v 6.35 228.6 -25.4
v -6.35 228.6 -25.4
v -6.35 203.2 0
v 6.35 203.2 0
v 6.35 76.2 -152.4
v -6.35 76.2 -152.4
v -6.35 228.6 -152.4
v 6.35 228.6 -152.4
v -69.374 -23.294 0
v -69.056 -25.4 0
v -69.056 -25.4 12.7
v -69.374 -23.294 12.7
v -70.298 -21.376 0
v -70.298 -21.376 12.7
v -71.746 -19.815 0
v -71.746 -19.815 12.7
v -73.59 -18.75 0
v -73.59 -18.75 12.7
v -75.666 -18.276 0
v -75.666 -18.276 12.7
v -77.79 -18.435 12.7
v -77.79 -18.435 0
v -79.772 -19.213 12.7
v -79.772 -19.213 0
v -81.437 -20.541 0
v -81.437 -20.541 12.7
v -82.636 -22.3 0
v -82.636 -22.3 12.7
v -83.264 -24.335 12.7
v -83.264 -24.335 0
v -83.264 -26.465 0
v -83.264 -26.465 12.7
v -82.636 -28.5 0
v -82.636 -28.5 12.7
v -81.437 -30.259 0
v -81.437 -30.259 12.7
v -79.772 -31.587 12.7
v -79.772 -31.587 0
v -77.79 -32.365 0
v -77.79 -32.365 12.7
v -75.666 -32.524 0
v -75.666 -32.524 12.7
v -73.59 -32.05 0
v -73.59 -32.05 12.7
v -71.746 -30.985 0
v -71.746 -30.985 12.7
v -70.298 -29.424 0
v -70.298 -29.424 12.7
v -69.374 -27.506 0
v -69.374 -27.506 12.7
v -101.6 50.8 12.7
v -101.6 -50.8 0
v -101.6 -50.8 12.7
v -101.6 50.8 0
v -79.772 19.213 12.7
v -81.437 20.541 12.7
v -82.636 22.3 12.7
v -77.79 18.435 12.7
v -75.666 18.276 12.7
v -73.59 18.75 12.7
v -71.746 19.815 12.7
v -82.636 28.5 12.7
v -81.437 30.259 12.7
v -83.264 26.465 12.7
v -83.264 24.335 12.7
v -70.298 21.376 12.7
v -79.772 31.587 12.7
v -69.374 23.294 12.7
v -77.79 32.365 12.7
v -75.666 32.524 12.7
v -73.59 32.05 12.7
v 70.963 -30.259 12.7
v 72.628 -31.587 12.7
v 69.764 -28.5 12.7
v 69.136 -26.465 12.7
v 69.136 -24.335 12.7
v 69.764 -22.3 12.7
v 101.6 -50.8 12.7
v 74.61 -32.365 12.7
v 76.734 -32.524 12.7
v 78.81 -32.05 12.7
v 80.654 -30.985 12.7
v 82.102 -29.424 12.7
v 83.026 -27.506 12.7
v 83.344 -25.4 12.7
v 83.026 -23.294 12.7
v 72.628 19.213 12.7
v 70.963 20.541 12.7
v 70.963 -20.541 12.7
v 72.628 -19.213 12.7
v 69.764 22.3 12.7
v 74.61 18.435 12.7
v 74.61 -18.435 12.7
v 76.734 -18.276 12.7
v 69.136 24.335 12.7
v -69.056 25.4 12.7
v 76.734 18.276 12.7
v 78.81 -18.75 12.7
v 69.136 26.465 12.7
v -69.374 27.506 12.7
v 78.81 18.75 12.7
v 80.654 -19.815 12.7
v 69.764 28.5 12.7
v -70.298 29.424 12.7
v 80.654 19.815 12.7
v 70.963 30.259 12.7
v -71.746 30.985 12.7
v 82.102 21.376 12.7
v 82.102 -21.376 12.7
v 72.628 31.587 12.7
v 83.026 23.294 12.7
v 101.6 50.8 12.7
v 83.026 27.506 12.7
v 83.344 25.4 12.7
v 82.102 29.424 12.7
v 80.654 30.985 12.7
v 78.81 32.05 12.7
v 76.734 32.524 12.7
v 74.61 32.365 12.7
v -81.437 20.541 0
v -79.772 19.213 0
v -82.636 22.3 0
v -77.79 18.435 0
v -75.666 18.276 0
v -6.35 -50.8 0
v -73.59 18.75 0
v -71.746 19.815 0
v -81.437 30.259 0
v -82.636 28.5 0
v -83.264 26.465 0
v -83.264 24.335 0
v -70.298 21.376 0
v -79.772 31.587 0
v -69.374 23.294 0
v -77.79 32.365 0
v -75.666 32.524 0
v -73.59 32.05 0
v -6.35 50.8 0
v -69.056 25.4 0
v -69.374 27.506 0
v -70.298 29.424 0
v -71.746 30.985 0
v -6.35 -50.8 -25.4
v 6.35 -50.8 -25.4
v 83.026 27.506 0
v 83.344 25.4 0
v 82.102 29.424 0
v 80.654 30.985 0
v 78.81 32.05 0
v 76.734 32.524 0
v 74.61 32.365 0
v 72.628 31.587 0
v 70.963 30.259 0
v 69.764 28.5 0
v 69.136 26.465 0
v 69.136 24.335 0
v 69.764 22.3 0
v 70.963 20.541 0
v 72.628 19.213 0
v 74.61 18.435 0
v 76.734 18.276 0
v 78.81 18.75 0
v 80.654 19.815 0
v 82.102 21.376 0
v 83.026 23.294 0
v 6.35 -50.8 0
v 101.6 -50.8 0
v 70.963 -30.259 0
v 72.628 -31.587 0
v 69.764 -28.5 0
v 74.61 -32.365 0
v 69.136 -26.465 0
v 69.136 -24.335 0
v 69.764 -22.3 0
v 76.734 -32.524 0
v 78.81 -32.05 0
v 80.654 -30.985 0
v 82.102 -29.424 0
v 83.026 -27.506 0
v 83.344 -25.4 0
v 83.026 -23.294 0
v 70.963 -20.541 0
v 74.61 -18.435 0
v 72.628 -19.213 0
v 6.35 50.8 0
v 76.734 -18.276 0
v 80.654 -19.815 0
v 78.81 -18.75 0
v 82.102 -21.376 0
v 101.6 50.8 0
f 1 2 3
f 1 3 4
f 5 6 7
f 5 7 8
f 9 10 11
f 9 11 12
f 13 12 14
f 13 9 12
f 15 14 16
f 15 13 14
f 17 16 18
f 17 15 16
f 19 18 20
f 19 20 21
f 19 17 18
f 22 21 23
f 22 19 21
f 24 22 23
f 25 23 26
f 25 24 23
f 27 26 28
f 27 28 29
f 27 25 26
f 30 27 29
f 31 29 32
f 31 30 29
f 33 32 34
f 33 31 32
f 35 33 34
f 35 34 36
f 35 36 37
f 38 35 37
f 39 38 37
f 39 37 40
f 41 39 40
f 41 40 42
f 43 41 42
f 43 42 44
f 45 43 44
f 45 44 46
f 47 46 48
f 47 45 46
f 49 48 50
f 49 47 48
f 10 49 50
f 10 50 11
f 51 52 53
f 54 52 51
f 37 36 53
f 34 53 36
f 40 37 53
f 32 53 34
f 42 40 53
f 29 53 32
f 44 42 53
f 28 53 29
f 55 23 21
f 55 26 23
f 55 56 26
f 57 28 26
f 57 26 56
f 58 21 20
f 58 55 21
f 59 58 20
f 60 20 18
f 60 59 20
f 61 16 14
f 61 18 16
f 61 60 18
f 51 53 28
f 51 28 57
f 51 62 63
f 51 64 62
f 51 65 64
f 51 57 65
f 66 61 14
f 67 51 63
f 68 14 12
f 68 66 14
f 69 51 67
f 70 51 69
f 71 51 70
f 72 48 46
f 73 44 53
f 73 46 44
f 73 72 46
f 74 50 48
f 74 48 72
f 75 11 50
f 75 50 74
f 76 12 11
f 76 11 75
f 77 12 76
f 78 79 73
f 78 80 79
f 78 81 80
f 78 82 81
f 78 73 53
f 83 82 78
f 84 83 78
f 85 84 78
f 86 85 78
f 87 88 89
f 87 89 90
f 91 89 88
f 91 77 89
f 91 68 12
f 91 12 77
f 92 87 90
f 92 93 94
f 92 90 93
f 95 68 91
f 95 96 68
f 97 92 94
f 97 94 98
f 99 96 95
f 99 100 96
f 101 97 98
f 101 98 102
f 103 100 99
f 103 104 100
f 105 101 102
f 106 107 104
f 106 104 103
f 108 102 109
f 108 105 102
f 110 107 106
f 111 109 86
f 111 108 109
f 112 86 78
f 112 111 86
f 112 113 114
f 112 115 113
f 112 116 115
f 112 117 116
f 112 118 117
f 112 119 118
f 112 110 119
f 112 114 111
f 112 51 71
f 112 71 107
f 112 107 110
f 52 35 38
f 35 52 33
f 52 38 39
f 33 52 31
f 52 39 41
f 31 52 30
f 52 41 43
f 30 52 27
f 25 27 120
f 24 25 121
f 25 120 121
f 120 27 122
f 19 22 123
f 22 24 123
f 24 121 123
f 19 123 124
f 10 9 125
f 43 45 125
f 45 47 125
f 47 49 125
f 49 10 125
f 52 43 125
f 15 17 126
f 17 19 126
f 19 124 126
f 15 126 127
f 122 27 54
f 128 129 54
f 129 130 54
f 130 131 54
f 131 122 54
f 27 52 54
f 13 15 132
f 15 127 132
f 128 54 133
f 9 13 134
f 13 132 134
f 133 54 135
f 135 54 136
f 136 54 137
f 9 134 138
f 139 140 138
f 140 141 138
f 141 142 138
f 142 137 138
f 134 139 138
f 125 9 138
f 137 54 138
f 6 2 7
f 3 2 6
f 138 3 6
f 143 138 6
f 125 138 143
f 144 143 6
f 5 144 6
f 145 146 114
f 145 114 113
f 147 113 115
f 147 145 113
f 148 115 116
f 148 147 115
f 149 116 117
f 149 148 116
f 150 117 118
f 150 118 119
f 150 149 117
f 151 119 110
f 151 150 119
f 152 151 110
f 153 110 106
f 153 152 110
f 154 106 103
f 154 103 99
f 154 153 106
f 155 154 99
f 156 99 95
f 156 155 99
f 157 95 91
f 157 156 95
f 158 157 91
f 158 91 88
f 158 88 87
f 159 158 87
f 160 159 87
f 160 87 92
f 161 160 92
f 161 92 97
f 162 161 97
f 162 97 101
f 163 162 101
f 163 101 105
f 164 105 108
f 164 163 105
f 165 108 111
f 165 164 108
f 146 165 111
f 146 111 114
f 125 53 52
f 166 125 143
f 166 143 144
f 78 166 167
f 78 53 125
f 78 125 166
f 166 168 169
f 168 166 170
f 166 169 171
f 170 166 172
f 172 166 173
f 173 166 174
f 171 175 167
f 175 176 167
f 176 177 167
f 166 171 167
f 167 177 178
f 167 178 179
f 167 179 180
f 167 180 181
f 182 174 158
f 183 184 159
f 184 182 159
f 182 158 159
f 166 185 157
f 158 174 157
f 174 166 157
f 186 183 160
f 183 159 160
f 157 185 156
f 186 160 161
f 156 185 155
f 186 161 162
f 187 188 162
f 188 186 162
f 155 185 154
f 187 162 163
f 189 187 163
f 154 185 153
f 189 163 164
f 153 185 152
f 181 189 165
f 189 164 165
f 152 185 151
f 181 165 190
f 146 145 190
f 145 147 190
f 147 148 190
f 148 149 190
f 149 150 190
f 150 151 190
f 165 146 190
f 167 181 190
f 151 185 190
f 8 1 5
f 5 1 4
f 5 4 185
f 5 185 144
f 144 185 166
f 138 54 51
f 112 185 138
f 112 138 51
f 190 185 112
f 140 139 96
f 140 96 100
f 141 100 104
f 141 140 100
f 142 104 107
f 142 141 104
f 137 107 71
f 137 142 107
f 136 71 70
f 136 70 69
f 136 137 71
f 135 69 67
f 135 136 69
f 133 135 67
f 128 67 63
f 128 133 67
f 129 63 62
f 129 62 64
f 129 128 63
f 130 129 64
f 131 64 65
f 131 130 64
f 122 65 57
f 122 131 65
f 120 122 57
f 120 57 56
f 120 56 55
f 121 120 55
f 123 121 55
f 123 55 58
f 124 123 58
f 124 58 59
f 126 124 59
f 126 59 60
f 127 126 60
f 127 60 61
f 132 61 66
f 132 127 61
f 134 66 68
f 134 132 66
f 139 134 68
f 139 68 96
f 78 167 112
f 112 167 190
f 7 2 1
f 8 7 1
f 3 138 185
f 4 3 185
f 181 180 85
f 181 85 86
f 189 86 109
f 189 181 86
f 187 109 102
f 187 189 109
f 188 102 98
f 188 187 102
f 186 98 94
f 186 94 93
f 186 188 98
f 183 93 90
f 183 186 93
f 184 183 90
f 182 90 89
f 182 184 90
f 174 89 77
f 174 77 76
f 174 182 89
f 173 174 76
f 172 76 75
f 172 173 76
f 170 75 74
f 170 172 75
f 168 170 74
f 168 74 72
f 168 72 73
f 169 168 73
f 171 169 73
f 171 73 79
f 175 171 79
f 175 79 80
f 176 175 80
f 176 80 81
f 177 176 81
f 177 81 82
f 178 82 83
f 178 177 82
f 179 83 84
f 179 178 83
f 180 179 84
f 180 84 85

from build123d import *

# Parameters (mm, degrees)
F0_W     = 203.2
F0_H     = 101.6
F0_R     = 7.14375
F1_DEPTH = 12.7
F2_W     = 12.7
F2_H     = 279.4
F3_DEPTH = 152.4
F5_DEPTH = 107.951
F6_SIZE  = 25.4


with BuildPart() as f1:
    # F0 (on Top) → F1 (new body)
    with BuildSketch(Plane.XY):
        Rectangle(F0_W, F0_H)
        with Locations((-76.2, -25.4)):
            Circle(F0_R, mode=Mode.SUBTRACT)
        with Locations((76.2, -25.4)):
            Circle(F0_R, mode=Mode.SUBTRACT)
        with Locations((-76.2, 25.4)):
            Circle(F0_R, mode=Mode.SUBTRACT)
        with Locations((76.2, 25.4)):
            Circle(F0_R, mode=Mode.SUBTRACT)
    extrude(amount=F1_DEPTH)

    # F2 (on face) → F3 (join)
    with BuildSketch(Plane(origin=(0, 0, 0), x_dir=(1, 0, 0), z_dir=(0, 0, -1))):
        with Locations((0, -88.9)):
            Rectangle(F2_W, F2_H)
    extrude(amount=F3_DEPTH)

    # F4 (on face) → F5 (cut, through all)
    with BuildSketch(Plane(origin=(-6.35, 0, 0), x_dir=(0, -1, 0), z_dir=(-1, 0, 0))):
        Polygon((50.8, -25.4), (-76.2, -152.4), (50.8, -152.4), align=None)
    extrude(amount=-F5_DEPTH, mode=Mode.SUBTRACT)

    # F6
    f6_edges = [f1.edges().sort_by_distance(p)[0] for p in [
        (0, 228.6, 0),
    ]]
    chamfer(f6_edges, length=F6_SIZE)


solid = f1.part
